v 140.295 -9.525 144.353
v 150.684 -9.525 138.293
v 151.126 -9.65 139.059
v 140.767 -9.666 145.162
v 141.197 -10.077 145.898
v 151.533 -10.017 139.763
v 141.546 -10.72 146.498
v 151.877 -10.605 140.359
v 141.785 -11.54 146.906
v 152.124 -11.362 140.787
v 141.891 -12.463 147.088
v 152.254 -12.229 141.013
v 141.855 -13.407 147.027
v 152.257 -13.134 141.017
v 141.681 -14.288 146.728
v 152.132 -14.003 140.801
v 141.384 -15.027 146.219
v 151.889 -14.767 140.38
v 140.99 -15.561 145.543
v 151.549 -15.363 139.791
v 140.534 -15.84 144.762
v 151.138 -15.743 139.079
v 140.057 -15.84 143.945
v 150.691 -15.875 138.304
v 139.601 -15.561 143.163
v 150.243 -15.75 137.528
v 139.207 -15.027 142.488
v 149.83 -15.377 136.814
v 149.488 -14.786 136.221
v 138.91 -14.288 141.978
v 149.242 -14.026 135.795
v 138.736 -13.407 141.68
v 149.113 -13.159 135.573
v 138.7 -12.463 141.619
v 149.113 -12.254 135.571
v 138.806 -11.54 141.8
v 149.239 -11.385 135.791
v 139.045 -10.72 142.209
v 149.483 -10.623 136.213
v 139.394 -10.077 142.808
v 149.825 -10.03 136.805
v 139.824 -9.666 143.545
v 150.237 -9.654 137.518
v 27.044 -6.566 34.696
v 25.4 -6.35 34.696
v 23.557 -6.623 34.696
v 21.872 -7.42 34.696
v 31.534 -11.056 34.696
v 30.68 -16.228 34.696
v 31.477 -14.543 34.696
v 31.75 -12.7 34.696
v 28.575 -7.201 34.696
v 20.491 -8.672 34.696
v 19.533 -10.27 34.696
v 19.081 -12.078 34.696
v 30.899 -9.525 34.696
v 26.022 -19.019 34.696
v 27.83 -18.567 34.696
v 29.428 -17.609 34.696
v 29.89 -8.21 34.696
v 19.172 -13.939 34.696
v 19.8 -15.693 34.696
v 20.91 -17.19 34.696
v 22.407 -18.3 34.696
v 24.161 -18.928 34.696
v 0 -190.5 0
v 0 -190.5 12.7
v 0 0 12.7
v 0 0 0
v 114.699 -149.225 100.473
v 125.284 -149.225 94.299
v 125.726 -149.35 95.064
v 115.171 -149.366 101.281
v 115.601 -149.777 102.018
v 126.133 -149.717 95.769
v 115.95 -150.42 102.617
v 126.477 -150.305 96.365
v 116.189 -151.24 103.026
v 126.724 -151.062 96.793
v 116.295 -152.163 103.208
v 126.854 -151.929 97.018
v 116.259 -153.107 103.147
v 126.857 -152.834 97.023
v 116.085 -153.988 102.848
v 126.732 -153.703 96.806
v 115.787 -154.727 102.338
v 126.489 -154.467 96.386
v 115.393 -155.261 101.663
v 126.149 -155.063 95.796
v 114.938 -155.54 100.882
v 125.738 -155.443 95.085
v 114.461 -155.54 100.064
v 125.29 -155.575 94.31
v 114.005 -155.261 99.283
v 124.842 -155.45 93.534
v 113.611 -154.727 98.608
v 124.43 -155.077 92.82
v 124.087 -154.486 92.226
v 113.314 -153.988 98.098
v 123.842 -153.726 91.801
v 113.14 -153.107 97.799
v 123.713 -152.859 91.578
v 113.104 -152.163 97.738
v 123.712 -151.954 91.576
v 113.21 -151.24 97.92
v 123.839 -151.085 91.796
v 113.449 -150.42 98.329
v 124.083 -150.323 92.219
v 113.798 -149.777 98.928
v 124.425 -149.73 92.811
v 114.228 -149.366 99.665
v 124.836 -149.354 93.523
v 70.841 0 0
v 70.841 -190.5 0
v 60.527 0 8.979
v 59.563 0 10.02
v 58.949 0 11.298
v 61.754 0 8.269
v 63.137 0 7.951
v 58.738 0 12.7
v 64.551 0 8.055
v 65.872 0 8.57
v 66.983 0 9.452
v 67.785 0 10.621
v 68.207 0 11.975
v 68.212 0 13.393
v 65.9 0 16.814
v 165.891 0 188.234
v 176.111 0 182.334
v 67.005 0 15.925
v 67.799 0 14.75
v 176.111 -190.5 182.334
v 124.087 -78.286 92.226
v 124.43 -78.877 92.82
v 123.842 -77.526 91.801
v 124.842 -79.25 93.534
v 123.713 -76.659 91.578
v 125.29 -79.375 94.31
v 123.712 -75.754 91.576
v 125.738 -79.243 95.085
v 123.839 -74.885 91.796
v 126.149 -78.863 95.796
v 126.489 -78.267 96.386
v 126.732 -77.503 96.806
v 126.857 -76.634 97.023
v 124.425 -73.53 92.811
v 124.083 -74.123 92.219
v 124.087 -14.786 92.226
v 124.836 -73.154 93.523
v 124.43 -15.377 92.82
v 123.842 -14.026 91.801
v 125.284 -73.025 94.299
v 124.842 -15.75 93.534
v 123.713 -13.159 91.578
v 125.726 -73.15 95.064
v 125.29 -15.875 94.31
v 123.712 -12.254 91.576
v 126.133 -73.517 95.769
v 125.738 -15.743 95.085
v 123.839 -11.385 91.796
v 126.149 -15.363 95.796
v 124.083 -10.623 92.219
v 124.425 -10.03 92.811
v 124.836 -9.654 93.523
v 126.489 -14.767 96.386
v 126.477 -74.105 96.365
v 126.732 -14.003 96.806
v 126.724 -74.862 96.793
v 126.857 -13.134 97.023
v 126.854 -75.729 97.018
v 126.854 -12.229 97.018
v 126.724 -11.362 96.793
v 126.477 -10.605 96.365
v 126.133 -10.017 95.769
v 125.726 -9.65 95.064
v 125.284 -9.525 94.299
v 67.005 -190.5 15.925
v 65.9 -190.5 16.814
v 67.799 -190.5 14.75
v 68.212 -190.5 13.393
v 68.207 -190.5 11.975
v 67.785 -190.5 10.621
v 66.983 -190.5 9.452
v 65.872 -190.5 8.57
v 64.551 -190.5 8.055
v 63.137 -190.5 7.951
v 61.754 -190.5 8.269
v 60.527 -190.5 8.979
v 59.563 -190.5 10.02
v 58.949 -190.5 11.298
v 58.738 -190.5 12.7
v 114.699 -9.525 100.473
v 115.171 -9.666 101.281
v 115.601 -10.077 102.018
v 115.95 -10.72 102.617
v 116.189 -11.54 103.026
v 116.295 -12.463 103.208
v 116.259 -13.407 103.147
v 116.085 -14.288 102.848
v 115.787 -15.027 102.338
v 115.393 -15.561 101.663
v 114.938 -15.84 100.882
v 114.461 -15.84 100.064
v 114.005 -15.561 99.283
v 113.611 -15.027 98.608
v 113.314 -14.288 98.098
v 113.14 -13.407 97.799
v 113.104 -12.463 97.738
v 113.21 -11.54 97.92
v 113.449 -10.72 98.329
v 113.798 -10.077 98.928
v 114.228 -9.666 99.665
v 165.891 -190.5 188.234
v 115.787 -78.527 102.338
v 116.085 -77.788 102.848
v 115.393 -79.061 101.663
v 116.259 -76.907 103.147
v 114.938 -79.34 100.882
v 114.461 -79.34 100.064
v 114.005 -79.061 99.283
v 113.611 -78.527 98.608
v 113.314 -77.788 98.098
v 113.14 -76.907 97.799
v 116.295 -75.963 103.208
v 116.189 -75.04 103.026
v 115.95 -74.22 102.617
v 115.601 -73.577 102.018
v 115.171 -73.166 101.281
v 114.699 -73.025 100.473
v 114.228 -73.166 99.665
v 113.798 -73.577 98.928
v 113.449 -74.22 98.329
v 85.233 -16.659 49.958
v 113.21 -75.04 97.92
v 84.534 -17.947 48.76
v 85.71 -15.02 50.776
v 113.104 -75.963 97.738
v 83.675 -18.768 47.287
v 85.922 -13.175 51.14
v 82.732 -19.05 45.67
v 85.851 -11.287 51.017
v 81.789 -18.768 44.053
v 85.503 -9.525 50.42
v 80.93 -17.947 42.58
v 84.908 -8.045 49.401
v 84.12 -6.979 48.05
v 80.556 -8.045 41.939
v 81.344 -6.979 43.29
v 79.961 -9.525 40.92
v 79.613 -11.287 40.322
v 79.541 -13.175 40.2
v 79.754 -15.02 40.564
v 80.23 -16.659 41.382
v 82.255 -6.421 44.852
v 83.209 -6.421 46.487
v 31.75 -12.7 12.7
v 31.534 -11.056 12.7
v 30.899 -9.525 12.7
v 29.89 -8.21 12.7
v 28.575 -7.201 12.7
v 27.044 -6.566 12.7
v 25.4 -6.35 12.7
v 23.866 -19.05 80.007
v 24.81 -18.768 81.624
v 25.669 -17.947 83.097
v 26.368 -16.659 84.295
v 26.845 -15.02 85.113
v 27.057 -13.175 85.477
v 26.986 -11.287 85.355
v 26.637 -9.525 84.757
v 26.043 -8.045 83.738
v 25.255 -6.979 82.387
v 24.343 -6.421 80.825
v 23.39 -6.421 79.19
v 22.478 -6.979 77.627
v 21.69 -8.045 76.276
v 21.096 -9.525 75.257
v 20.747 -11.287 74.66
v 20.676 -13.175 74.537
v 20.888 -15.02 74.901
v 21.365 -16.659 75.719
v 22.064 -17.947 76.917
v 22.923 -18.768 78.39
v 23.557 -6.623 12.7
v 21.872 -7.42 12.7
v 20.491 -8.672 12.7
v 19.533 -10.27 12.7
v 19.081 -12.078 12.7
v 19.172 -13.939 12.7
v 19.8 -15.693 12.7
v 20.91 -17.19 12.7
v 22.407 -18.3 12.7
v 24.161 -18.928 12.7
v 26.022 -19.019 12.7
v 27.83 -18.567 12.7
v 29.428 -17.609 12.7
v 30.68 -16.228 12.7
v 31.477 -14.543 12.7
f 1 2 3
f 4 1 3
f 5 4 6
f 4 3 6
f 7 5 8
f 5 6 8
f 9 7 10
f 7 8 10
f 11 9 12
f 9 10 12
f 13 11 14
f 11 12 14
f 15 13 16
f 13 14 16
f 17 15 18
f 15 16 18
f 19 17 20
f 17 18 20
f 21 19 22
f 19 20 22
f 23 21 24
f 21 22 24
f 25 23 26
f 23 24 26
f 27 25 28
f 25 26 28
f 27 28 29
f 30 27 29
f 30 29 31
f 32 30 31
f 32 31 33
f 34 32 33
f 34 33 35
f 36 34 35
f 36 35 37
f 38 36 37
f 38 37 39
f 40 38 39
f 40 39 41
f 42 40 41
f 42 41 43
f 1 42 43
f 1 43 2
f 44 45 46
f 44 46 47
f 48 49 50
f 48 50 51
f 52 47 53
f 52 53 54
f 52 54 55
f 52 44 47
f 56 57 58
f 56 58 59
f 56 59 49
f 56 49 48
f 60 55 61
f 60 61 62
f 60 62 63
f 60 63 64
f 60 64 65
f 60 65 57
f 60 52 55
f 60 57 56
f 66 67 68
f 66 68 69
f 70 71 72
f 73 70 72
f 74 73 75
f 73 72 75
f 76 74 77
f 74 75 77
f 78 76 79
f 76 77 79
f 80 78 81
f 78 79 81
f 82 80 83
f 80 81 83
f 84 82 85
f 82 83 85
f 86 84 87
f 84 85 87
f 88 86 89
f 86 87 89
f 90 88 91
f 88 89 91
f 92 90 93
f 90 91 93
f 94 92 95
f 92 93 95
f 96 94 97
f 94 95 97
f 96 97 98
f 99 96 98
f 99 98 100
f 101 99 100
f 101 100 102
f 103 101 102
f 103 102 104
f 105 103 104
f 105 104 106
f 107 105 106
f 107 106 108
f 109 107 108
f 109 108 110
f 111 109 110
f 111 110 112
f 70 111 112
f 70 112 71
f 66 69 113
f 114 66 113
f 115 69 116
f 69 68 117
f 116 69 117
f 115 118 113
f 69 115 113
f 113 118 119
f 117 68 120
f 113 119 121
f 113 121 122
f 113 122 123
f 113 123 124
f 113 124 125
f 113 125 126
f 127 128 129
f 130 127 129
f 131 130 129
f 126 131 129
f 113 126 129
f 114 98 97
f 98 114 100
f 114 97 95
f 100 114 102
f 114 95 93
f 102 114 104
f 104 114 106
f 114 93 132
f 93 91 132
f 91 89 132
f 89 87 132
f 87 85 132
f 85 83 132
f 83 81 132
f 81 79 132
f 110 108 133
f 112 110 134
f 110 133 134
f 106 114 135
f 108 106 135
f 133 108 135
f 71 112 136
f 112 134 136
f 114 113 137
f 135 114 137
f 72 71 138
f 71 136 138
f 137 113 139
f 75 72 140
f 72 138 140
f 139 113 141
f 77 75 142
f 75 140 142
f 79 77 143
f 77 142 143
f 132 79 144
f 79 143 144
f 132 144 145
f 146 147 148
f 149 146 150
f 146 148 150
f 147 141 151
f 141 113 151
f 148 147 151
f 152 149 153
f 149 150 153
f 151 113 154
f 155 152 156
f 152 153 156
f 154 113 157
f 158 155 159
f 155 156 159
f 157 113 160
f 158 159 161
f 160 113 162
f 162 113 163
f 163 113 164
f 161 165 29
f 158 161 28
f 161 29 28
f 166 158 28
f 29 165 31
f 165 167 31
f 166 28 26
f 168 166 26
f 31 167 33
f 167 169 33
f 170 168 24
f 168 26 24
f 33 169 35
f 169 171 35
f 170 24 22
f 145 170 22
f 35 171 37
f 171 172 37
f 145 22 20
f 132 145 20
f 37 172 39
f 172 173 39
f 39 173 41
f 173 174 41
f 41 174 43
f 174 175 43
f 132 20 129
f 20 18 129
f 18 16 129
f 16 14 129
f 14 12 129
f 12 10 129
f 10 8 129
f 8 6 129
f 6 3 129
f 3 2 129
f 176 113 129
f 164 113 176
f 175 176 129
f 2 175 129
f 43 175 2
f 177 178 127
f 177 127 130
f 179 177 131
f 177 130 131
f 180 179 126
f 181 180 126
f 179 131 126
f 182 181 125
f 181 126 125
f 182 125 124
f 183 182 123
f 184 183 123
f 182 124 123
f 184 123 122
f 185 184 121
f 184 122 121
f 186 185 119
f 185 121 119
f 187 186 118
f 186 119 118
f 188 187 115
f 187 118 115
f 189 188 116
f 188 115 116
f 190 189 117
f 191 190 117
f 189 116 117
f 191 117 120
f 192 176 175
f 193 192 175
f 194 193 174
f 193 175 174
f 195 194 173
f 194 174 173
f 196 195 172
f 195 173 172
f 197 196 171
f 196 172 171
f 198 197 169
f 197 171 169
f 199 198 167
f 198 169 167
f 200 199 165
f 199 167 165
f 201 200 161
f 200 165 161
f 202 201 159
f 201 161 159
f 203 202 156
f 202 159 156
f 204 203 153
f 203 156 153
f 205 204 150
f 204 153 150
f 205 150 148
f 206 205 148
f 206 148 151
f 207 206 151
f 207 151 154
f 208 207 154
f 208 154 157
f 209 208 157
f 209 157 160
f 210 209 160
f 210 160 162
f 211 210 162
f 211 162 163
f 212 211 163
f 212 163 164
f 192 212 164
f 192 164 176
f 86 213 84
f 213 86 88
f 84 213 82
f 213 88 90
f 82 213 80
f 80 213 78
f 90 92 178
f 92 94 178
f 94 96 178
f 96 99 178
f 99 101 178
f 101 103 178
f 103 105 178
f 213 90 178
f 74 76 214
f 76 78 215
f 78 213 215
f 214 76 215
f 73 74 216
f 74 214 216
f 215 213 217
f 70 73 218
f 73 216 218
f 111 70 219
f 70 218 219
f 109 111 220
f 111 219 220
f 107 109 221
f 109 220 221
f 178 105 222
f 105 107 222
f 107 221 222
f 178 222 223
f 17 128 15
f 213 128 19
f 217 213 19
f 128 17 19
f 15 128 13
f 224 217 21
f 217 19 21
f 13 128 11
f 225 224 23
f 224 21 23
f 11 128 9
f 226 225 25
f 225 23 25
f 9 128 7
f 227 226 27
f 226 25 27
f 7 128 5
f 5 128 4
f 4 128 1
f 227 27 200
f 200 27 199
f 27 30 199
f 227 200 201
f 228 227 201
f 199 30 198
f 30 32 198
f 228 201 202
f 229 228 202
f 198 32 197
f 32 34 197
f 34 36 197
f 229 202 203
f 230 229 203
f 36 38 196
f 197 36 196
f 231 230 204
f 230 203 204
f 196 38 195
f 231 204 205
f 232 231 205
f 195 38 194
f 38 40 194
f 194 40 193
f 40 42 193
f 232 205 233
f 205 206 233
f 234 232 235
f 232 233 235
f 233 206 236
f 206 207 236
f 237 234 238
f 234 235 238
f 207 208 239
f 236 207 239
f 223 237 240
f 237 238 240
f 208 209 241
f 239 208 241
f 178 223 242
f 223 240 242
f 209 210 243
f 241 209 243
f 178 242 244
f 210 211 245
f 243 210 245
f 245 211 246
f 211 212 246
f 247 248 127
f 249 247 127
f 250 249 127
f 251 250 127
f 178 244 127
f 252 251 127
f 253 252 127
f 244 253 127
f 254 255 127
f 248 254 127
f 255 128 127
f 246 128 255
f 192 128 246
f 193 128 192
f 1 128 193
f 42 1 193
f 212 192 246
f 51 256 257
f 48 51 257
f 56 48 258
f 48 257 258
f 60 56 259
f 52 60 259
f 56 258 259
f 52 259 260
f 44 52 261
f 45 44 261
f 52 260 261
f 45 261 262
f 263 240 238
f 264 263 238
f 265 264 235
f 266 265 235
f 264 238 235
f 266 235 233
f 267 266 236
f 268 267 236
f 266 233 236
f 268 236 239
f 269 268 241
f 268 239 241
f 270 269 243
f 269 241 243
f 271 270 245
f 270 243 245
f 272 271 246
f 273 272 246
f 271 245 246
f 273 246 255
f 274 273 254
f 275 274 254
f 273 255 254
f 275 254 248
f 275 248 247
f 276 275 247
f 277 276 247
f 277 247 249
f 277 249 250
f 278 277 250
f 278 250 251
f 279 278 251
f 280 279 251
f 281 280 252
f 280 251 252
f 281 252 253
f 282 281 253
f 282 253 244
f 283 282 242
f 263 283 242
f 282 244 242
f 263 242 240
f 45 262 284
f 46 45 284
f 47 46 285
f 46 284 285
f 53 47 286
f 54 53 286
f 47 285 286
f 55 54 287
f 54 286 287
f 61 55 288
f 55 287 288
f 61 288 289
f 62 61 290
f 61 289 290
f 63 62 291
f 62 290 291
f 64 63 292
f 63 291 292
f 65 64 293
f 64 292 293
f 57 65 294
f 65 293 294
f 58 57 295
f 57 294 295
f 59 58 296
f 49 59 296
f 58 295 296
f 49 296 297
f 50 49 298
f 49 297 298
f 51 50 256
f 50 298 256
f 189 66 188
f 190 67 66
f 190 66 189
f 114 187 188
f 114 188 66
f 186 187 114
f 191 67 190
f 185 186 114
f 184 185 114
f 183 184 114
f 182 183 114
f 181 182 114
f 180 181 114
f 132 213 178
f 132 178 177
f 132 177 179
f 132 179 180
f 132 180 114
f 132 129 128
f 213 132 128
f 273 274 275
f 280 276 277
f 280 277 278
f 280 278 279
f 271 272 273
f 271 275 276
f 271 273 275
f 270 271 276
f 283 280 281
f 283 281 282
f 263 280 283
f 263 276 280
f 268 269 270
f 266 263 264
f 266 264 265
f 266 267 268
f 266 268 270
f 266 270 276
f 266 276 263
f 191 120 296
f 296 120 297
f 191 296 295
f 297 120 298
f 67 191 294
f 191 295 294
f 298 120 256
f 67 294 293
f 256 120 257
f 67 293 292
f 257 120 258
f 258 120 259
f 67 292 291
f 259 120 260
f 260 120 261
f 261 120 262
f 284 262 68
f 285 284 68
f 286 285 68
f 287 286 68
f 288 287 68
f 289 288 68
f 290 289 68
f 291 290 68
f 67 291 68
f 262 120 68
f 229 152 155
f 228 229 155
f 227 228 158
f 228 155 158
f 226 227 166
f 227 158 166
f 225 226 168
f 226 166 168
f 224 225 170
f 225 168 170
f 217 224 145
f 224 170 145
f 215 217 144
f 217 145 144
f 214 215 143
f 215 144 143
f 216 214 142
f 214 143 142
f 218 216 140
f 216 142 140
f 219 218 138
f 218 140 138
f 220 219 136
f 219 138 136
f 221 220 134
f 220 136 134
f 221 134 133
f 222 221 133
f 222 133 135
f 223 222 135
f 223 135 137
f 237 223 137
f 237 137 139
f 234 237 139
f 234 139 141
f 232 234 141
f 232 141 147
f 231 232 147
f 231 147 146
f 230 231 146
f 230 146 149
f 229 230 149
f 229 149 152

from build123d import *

# Parameters (mm, degrees)
F1_DEPTH = 190.5
F3_DEPTH = 21.9964
F4_R     = 6.35
F5_DEPTH = 68.1482
F6_D     = 6.35


with BuildPart() as f1:
    # F0 (on Front) → F1 (new body)
    with BuildSketch(Plane.XZ):
        with BuildLine():
            Line((0, 12.7), (0, 0))
            Line((0, 0), (70.8406, 0))
            Line((70.8406, 0), (176.1109, 182.333508128))
            Line((176.1109, 182.333508128), (165.8914941513, 188.2336848457))
            Line((165.8914941513, 188.2336848457), (65.8996305851, 16.8137791998))
            ThreePointArc((65.8996305851, 16.8137791998), (65.872041904, 8.5702514052), (58.7375, 12.7))
            Line((58.7375, 12.7), (0, 12.7))
        make_face()
    extrude(amount=F1_DEPTH)

    # F2 (on face) → F3 (join)
    with BuildSketch(Plane.XY.offset(12.7)):
        with BuildLine():
            ThreePointArc((25.4, -6.35), (20.9098719395, -17.1901280605), (31.75, -12.7))
            ThreePointArc((31.75, -12.7), (29.8901280605, -8.2098719395), (25.4, -6.35))
        make_face()
    extrude(amount=F3_DEPTH)

    # F4 (on face) → F5 (join)
    with BuildSketch(Plane(origin=(41.8516023858, 0, -24.4126824129), x_dir=(0, -1, 0), z_dir=(-0.8637856588, 0, 0.5038594404))):
        with Locations((12.7, 81.1343050771)):
            Circle(F4_R)
    extrude(amount=F5_DEPTH)

    # F6 (through all)
    with Locations(Plane(origin=(41.8516023858, 0, -24.4126824129), x_dir=(0, -1, 0), z_dir=(-0.8637856588, 0, 0.5038594404))):
        with Locations((12.7, 195.3795528826), (12.7, 144.5795528826), (76.2, 144.5795528826), (152.4, 144.5795528826)):
            Hole(F6_D / 2)


solid = f1.part
